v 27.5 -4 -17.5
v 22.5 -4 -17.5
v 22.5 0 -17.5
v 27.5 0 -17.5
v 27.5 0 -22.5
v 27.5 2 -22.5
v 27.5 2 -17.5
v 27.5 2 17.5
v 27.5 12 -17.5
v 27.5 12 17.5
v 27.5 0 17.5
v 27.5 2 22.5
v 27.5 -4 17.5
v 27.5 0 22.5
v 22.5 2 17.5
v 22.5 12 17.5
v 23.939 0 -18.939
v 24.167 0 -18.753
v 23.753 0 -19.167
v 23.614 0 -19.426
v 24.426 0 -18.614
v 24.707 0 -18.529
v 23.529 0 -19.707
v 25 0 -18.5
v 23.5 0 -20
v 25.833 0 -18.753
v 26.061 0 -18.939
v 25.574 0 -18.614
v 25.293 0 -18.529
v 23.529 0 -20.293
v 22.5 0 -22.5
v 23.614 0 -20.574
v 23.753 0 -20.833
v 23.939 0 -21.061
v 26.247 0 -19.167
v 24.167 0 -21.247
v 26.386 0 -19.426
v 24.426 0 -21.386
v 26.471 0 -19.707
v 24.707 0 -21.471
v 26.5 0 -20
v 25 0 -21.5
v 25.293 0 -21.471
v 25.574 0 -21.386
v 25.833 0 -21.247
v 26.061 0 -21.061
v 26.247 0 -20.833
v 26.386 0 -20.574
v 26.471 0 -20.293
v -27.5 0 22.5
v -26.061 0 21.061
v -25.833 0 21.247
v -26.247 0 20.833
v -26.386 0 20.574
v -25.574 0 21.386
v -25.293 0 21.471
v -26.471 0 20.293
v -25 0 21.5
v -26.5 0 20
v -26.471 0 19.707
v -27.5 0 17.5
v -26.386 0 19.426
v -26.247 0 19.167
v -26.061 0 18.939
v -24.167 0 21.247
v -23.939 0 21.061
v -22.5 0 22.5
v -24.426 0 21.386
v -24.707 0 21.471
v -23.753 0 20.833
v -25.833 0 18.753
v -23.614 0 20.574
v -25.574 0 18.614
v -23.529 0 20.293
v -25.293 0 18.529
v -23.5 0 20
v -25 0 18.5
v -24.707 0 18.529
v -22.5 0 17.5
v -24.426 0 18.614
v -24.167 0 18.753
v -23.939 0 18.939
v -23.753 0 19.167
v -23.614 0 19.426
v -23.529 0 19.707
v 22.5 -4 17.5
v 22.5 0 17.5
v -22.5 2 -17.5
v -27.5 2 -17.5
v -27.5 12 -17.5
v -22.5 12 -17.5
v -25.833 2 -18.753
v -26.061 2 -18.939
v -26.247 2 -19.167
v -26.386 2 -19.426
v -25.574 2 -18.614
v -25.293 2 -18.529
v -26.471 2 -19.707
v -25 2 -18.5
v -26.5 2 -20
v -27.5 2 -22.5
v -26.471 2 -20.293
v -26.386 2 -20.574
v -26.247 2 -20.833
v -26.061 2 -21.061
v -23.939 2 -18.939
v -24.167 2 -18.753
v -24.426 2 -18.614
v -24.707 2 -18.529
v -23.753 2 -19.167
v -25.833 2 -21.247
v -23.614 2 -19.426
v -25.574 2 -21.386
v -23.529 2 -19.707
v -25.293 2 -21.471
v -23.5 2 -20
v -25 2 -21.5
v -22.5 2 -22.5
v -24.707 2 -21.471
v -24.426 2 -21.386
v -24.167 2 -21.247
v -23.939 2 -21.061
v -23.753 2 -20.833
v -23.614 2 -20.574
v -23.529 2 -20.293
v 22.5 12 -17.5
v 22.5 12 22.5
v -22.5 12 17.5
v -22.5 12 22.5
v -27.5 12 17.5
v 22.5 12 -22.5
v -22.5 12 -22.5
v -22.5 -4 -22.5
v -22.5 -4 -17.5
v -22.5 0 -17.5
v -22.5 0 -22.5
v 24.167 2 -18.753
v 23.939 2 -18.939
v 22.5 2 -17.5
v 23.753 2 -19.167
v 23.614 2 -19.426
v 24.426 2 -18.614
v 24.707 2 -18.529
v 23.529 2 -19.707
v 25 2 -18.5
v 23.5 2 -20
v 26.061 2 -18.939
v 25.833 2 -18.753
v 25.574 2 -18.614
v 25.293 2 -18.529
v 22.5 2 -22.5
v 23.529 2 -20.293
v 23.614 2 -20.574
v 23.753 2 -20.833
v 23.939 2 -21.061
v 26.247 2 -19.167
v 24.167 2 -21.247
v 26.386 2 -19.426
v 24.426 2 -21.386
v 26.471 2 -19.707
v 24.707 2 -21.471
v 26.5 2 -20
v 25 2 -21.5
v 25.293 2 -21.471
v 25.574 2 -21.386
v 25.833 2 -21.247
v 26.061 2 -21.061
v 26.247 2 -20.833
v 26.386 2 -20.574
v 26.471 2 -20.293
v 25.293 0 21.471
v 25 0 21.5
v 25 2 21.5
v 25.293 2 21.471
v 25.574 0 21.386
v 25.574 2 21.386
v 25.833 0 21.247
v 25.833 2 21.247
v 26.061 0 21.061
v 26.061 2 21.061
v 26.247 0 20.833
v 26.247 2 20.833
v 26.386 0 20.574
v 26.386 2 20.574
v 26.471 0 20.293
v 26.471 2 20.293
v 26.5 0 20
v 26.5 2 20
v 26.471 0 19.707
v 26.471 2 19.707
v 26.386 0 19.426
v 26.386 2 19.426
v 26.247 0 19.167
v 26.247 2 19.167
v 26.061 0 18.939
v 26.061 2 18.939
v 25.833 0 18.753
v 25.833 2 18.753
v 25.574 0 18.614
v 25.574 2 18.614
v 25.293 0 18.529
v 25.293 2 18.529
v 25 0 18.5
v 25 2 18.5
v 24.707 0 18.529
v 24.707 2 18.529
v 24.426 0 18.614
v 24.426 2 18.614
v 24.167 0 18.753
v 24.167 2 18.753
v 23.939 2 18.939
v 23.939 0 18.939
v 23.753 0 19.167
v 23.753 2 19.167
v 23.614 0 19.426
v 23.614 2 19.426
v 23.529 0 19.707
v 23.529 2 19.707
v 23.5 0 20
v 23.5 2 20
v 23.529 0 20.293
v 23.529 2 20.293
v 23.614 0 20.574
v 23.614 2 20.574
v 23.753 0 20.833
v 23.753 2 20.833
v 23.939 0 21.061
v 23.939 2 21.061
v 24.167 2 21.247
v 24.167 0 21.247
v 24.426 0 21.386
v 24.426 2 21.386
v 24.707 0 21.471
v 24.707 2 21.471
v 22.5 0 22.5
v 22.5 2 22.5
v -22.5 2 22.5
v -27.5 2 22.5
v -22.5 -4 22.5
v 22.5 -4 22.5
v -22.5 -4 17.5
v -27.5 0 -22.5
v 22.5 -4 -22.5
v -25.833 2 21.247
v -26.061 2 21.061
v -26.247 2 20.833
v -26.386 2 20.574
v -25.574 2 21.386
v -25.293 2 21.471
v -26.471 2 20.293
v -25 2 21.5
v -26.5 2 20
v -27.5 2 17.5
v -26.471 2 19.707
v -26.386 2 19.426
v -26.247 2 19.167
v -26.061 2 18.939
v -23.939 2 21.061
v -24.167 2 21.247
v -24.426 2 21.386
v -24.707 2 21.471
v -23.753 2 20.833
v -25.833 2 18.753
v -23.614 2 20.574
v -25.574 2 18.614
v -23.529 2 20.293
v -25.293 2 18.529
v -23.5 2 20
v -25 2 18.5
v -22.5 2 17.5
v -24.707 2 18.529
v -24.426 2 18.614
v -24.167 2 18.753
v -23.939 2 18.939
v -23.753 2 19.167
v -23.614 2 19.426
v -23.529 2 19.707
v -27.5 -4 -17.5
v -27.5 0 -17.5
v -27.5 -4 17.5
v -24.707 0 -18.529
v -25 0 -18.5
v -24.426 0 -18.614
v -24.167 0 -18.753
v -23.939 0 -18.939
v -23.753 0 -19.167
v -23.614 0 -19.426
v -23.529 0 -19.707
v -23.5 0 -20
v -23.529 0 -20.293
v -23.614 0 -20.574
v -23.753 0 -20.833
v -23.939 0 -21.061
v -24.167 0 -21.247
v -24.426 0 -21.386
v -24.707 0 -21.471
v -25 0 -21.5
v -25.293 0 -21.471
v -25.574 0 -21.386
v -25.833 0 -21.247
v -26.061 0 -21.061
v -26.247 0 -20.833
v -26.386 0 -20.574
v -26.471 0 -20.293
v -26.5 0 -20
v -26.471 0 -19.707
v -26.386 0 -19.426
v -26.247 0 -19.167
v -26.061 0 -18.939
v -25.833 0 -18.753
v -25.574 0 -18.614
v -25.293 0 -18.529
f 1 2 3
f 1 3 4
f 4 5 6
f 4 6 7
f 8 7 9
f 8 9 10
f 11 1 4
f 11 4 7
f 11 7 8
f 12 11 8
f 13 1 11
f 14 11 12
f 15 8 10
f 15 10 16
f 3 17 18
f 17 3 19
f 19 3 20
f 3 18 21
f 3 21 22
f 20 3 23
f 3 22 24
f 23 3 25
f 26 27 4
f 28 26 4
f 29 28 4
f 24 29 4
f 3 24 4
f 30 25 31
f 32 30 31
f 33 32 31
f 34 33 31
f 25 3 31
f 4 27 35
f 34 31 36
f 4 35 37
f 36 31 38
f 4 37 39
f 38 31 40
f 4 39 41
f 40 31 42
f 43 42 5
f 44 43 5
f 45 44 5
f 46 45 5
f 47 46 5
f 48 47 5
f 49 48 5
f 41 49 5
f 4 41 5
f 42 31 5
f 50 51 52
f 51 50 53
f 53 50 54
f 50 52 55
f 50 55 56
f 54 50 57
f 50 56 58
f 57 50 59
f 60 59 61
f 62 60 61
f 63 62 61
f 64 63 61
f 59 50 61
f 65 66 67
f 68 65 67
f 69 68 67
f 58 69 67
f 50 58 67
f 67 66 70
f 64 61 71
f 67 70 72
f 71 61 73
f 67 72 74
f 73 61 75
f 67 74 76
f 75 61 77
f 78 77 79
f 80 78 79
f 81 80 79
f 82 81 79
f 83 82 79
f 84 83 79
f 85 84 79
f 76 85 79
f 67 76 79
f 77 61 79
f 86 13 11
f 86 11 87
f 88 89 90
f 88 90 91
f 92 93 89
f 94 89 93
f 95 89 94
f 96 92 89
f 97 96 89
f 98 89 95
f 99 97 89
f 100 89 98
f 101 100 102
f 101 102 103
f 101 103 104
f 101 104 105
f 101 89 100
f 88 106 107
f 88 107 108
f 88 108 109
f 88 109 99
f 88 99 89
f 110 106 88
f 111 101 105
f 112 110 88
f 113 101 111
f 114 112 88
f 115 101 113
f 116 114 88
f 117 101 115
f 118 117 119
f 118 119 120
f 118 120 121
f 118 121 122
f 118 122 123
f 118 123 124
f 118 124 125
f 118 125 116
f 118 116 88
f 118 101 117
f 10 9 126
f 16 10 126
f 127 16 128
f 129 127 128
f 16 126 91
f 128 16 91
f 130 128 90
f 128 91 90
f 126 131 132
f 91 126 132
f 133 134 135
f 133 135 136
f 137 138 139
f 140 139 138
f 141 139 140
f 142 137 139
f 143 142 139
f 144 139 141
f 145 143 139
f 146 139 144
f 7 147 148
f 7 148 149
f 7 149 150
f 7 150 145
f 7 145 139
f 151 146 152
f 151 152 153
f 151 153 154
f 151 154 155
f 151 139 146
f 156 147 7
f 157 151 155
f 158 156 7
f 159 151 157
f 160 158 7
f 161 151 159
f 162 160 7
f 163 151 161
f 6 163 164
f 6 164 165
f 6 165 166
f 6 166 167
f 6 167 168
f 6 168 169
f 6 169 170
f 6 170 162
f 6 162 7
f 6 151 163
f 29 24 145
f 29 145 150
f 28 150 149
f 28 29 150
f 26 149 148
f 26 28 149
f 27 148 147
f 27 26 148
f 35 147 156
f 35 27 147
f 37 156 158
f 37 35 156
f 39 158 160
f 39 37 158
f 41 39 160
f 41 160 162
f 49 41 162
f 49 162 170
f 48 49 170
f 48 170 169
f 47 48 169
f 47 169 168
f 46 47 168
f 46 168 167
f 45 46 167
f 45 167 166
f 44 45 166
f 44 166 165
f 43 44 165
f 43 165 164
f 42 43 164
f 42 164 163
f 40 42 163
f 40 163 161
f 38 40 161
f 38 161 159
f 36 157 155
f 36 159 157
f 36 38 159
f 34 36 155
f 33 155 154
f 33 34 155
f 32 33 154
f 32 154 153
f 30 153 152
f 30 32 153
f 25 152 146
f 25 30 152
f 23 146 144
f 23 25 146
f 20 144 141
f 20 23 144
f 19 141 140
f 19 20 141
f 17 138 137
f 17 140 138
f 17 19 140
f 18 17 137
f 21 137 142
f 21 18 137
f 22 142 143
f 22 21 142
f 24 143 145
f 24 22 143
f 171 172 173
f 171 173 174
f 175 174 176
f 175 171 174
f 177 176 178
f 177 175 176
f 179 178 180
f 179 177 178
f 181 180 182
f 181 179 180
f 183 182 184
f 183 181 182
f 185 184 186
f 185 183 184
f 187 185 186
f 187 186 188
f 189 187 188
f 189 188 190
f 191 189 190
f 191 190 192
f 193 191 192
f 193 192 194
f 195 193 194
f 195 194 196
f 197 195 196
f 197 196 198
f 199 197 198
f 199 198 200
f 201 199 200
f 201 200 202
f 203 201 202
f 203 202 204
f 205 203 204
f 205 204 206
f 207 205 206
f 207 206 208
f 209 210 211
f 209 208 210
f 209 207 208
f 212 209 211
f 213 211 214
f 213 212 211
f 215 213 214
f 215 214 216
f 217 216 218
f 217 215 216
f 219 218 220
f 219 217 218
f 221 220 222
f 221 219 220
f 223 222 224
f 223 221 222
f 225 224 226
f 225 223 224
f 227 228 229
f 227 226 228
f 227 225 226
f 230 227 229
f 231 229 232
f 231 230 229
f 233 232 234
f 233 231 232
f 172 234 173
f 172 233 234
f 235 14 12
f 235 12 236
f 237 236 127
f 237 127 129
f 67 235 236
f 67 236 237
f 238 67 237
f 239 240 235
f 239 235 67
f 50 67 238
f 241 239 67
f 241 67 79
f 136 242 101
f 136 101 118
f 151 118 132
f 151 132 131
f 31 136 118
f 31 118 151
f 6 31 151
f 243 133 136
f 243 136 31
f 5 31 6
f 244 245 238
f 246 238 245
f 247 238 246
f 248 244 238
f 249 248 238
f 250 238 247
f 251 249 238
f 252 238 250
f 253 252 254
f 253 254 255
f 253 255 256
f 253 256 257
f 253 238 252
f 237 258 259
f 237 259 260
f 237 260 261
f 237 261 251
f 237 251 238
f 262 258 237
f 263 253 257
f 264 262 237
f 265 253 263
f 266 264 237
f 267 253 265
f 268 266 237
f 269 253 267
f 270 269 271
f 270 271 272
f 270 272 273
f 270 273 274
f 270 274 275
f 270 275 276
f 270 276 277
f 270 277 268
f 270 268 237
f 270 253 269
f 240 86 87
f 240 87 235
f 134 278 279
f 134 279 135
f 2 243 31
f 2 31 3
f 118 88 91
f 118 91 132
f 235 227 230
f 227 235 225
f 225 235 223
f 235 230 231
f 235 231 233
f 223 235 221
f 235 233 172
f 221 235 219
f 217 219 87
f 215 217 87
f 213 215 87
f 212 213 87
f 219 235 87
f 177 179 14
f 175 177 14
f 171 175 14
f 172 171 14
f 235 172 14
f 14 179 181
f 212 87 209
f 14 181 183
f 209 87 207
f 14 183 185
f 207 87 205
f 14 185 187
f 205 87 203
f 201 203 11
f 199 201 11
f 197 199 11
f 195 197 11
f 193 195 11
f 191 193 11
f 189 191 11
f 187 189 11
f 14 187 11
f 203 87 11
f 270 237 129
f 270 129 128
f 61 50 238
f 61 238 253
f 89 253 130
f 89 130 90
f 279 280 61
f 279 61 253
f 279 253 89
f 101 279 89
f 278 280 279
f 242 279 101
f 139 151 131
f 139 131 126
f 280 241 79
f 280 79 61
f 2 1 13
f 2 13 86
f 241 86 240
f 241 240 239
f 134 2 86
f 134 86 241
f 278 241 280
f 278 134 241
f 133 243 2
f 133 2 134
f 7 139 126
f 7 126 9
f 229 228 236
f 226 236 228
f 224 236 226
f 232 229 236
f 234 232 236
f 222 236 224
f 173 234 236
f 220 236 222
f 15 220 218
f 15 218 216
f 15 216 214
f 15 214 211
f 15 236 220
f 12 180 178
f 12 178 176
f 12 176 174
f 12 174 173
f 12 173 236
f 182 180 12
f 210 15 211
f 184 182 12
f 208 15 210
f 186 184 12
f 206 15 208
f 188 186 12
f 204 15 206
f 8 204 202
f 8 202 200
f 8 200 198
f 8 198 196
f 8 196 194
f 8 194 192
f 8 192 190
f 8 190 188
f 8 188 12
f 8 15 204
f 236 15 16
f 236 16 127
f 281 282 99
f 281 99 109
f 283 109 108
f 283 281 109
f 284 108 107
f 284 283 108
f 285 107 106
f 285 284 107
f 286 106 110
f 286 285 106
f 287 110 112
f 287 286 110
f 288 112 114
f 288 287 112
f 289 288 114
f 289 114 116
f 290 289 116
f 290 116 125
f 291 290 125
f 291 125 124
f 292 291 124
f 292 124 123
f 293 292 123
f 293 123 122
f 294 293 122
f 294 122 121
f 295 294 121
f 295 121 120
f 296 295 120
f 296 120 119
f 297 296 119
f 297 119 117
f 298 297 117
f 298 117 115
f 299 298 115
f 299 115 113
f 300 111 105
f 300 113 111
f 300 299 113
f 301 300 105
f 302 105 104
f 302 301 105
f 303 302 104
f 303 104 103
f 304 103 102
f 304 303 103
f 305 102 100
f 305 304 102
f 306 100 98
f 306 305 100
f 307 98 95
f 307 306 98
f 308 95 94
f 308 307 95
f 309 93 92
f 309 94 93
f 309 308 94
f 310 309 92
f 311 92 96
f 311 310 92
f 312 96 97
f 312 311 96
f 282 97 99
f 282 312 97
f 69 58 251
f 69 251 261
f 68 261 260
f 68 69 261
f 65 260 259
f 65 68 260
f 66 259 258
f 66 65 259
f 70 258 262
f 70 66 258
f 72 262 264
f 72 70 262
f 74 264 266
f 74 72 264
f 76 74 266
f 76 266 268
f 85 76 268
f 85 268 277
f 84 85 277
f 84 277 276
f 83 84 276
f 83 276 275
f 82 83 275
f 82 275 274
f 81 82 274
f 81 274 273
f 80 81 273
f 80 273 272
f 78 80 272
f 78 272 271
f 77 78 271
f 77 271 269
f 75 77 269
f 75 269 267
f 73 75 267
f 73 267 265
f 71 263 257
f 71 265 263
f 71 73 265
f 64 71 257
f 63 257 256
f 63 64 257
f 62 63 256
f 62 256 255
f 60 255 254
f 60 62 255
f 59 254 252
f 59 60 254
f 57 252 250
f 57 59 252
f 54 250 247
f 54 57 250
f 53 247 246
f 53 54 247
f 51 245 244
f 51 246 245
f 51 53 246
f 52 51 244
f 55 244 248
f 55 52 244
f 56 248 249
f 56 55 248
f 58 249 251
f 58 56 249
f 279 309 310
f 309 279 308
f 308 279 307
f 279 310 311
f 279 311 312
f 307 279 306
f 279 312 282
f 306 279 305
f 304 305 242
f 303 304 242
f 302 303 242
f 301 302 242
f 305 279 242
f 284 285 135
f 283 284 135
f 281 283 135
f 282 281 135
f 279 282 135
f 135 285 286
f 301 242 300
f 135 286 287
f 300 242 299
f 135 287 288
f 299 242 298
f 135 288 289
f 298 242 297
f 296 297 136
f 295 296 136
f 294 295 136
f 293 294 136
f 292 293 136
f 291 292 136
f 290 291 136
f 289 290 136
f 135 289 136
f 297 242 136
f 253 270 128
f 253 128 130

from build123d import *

# Parameters (mm, degrees)
SKETCH_1_W                 = 55
SKETCH_1_H                 = 45
EXTRUDE_360_DEPTH          = 2
CUT_EXTRUDE_614_DEPTH      = 36.587919299
CUT_EXTRUDE_614_DEPTH_BACK = 36.587919299
SKETCH_2_R                 = 1.5
EXTRUDE_883_DEPTH          = 10
EXTRUDE_883_DEPTH_BACK     = 6


with BuildPart() as part:
    # Эскиз1 → Extrude 360 (new body)
    with BuildSketch(Plane(origin=(0, 0, 0), x_dir=(1, 0, 0), z_dir=(0, 1, 0))):
        Rectangle(SKETCH_1_W, SKETCH_1_H)
    extrude(amount=EXTRUDE_360_DEPTH)

    # Эскиз2 → Cut-Extrude 614 (cut, two sides: drawn at the far end of the back side and taken through both)
    with BuildSketch(Plane(origin=(0, 2, 0), x_dir=(1, 0, 0), z_dir=(0, 1, 0)).offset(-CUT_EXTRUDE_614_DEPTH_BACK)):
        with Locations(Location((-25, 20, 0), (0, 0, 270))):
            Circle(SKETCH_2_R)
        with Locations(Location((25, 20, 0), (0, 0, 270))):
            Circle(SKETCH_2_R)
        with Locations(Location((25, -20, 0), (0, 0, 270))):
            Circle(SKETCH_2_R)
        with Locations(Location((-25, -20, 0), (0, 0, 270))):
            Circle(SKETCH_2_R)
    extrude(amount=CUT_EXTRUDE_614_DEPTH + CUT_EXTRUDE_614_DEPTH_BACK, mode=Mode.SUBTRACT)

    # Эскиз3 → Extrude 883 (add, two sides: drawn at the far end of the back side and taken through both)
    with BuildSketch(Plane(origin=(0, 2, 0), x_dir=(1, 0, 0), z_dir=(0, 1, 0)).offset(-EXTRUDE_883_DEPTH_BACK)):
        Polygon((-27.5, 17.5), (-22.5, 17.5), (-22.5, 22.5), (22.5, 22.5), (22.5, 17.5), (27.5, 17.5), (27.5, -17.5), (22.5, -17.5), (22.5, -22.5), (-22.5, -22.5), (-22.5, -17.5), (-27.5, -17.5), align=None)
    extrude(amount=EXTRUDE_883_DEPTH + EXTRUDE_883_DEPTH_BACK)


solid = part.part
